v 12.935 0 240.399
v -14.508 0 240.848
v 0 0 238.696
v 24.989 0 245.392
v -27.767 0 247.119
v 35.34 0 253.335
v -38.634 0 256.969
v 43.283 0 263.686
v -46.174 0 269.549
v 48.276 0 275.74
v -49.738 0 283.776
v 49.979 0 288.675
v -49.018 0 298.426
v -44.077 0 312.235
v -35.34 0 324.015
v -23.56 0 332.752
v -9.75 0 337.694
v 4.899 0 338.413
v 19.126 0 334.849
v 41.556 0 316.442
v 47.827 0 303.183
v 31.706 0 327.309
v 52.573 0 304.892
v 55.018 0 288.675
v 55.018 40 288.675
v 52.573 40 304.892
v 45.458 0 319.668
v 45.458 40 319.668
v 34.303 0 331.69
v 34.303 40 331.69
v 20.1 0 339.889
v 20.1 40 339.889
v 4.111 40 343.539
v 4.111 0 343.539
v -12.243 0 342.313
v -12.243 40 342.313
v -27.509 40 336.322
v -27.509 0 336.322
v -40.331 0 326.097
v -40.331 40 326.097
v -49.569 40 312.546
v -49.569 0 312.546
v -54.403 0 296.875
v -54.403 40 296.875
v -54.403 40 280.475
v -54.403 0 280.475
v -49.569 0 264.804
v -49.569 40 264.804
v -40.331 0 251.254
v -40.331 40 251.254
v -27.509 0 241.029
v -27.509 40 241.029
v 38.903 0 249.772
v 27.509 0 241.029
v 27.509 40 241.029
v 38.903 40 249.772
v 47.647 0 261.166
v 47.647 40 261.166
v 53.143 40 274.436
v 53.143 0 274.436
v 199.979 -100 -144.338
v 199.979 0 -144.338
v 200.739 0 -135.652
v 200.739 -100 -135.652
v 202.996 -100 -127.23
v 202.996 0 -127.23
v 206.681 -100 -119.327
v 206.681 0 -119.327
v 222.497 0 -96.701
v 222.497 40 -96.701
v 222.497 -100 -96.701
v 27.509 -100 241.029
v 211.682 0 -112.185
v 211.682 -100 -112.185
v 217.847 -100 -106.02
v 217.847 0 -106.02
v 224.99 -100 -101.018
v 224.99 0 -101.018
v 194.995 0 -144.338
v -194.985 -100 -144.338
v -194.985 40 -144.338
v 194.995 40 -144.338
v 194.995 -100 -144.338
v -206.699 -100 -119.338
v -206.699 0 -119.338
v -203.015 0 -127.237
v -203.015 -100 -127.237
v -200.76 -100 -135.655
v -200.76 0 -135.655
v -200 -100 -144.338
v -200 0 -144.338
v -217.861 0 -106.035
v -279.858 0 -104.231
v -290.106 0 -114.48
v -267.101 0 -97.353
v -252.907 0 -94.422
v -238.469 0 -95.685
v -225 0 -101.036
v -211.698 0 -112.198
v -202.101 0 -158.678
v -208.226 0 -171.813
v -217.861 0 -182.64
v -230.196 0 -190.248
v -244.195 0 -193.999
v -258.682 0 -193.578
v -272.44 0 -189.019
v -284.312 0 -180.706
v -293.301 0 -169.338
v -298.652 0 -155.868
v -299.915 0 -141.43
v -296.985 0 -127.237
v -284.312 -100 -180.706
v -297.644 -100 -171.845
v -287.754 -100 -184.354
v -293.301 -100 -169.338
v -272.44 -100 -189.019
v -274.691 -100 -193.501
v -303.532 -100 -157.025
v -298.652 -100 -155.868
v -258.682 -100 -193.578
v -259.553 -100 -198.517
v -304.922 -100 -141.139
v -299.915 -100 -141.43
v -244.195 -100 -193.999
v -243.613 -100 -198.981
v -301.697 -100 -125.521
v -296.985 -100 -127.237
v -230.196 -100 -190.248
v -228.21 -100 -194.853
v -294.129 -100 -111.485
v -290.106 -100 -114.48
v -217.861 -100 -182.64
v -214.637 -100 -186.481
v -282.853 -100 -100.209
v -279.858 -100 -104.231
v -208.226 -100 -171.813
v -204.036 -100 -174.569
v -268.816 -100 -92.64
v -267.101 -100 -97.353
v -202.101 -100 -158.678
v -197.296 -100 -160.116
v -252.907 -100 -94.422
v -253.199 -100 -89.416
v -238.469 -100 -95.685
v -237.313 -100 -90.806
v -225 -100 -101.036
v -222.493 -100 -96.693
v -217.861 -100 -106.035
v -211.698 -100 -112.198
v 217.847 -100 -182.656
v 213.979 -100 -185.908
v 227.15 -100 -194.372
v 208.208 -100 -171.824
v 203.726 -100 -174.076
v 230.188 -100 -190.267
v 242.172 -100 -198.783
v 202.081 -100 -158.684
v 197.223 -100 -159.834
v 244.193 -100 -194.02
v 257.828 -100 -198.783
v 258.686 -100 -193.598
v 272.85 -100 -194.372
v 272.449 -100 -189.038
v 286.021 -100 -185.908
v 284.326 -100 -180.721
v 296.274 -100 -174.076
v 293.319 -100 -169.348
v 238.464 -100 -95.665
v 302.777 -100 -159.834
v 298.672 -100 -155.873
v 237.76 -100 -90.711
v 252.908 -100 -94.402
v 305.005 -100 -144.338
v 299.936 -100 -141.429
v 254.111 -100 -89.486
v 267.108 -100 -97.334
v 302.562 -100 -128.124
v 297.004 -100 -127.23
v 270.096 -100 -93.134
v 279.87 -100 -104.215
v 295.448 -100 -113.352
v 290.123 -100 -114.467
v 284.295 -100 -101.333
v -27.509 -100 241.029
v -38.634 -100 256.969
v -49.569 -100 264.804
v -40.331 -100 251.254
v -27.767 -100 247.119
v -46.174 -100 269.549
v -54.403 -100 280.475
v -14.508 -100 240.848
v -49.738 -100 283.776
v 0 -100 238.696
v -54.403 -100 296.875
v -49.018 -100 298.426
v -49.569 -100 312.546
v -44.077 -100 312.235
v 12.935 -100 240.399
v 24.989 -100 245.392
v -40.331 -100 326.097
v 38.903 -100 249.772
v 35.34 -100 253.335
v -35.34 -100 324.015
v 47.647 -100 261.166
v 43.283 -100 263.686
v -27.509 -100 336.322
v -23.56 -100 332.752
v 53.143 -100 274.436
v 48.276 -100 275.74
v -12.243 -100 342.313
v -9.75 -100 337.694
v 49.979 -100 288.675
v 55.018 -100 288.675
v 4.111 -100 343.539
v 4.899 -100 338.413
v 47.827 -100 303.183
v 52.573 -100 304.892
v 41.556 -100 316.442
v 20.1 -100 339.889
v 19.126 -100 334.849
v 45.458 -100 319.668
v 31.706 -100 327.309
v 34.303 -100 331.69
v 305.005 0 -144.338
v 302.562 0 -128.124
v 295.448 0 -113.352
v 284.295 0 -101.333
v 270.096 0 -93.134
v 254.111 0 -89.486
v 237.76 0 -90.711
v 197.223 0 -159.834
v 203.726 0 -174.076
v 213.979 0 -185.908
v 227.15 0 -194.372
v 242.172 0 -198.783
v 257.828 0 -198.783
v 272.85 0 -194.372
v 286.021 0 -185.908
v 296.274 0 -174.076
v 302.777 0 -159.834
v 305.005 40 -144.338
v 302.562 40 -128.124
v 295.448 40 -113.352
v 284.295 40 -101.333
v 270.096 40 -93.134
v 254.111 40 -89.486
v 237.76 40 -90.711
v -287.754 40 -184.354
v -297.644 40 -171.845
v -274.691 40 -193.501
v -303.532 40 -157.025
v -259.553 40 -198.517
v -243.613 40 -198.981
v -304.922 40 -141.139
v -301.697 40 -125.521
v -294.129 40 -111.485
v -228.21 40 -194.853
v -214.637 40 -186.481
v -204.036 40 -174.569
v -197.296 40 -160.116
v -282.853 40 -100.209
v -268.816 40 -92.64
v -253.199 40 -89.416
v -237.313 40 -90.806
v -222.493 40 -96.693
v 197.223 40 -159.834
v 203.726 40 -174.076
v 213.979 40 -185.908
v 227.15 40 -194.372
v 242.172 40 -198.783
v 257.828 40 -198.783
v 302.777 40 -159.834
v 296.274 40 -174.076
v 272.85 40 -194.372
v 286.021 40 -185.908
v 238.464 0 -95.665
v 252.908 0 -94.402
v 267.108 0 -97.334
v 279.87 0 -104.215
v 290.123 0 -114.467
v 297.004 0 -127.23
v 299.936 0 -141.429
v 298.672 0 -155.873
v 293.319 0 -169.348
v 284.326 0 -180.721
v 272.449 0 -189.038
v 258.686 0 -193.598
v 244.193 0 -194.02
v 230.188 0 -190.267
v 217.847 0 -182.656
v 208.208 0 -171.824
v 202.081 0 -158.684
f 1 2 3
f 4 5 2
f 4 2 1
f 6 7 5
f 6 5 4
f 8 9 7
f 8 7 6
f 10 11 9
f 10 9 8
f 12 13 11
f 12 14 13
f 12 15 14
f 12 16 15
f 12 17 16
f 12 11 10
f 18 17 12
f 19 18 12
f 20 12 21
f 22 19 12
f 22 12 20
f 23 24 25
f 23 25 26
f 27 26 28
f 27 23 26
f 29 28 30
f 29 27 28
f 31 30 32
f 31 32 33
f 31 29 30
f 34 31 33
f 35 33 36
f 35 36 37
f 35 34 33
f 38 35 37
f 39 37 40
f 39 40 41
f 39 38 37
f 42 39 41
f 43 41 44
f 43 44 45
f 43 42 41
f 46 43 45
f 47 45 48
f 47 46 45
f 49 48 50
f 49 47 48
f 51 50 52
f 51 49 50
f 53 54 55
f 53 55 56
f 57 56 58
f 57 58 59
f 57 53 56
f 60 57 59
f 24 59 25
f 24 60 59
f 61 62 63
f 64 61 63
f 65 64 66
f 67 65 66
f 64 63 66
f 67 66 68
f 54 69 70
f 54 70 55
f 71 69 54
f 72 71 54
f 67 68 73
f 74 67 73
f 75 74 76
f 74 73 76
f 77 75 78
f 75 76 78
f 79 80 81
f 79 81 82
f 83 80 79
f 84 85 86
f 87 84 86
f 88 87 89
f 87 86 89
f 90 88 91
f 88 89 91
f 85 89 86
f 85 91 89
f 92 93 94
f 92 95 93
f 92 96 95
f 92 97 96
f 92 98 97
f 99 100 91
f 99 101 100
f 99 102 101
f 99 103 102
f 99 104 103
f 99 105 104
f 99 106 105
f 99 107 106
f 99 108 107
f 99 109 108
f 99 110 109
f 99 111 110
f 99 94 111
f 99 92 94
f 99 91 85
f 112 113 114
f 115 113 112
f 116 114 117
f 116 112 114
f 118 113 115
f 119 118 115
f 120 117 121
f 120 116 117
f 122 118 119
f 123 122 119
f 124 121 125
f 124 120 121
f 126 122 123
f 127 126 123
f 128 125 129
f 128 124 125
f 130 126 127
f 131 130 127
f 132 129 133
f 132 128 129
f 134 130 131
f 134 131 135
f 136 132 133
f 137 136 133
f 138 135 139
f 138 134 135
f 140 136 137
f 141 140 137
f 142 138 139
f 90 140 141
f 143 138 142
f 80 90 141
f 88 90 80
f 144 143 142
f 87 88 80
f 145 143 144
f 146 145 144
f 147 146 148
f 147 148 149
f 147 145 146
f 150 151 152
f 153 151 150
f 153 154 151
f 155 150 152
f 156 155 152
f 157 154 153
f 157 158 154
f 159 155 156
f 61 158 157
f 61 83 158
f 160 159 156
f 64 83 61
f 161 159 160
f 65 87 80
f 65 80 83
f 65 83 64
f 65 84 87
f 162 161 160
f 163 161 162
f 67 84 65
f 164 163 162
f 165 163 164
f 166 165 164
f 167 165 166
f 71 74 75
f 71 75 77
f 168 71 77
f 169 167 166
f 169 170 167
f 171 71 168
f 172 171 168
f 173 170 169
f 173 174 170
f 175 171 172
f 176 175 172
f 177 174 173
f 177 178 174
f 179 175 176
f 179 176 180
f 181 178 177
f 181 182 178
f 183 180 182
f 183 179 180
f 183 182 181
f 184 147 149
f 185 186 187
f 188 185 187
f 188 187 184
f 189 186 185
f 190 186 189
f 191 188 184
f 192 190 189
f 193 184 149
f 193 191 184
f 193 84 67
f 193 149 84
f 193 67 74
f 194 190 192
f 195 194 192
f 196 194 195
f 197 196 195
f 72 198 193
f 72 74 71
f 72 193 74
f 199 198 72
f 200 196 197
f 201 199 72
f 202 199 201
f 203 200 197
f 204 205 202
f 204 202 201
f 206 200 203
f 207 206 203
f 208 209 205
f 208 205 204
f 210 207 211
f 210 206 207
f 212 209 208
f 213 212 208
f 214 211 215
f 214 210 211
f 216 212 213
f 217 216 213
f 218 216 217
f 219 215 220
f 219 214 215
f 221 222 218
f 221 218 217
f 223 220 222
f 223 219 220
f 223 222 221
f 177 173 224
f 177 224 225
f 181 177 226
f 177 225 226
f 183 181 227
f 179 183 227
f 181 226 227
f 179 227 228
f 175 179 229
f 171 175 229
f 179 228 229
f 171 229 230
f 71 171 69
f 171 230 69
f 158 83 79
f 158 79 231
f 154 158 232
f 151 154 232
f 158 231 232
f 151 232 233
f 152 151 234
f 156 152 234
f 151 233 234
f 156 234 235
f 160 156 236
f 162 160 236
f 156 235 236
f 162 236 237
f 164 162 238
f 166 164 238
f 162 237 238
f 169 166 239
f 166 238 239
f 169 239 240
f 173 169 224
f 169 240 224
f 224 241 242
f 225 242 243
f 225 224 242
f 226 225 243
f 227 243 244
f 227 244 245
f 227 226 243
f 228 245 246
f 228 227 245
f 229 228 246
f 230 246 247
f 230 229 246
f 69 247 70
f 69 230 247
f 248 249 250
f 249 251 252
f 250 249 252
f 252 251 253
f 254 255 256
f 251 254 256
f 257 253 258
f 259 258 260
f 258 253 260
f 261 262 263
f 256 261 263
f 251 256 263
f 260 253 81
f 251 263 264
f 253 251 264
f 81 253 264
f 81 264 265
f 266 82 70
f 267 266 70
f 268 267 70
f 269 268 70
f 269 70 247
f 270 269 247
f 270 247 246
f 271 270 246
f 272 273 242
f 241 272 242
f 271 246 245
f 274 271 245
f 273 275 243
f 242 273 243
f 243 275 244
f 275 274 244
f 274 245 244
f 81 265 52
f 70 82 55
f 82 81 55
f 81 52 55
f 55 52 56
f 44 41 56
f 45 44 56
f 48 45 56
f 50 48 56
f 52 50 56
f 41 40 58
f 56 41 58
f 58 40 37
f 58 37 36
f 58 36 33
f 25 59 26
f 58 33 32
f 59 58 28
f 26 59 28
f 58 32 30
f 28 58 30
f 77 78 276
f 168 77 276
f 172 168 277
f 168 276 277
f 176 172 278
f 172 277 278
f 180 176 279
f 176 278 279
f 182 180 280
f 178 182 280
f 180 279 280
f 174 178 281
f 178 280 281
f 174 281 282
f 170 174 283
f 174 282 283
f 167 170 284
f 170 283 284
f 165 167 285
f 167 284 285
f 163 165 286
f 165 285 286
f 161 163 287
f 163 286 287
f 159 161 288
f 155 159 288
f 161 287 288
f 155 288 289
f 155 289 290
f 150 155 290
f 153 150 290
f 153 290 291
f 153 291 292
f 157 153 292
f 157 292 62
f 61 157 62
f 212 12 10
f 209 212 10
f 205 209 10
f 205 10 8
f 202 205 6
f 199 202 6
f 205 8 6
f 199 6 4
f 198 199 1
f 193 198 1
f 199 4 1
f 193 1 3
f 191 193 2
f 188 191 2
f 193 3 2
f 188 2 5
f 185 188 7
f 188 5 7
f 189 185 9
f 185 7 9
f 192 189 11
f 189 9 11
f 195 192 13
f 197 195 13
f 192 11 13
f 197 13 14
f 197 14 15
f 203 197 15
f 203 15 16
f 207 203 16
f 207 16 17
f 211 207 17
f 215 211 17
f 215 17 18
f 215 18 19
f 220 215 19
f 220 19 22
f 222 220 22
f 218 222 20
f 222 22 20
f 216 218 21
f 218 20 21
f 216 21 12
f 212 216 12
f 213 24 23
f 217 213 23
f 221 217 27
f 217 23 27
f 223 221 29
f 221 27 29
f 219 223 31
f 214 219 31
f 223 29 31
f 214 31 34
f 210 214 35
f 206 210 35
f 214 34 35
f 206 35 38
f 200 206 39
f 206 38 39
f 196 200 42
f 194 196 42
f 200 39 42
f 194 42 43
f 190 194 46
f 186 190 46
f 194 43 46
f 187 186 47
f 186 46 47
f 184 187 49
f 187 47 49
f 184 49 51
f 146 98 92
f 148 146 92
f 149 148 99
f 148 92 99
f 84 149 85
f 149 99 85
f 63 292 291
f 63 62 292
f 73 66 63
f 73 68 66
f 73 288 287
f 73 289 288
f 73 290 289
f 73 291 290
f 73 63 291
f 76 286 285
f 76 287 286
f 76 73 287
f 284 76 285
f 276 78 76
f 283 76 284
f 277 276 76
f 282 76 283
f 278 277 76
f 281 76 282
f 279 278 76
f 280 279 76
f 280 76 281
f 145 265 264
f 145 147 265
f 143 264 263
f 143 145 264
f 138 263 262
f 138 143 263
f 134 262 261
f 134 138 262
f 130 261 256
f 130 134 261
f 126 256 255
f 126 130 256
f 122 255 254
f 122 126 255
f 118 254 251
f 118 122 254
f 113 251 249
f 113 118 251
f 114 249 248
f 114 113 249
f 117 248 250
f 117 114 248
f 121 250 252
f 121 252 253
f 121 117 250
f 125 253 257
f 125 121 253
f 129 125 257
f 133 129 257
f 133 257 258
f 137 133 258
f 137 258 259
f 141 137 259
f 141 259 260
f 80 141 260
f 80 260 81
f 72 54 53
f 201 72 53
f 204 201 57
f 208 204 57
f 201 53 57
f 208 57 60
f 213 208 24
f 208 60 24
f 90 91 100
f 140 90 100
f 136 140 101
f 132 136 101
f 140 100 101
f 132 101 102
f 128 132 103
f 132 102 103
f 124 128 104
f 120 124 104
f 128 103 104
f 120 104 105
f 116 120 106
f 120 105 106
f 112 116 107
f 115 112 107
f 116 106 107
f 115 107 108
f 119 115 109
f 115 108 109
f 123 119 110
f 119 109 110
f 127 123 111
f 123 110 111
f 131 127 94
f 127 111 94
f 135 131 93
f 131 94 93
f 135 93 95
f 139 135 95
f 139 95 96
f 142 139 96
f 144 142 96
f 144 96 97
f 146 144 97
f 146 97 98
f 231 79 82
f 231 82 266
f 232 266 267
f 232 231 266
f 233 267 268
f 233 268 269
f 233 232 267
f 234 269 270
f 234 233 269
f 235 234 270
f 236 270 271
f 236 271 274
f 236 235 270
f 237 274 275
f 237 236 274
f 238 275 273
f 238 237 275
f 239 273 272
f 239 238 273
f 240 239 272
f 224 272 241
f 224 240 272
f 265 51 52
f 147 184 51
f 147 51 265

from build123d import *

# Parameters (mm, degrees)
F1_DEPTH = 100
F2_DEPTH = 40


with BuildPart() as f1:
    # F0 (on Front) → F1 (new body)
    with BuildSketch(Plane.XZ):
        with BuildLine():
            ThreePointArc((-222.4925176197, -96.6932102265), (-297.6443570709, -171.8450496777), (-194.9850352394, -144.3375672974))
            Line((-194.9850352394, -144.3375672974), (-200, -144.3375672974))
            ThreePointArc((-200, -144.3375672974), (-293.3012701892, -169.3375672974), (-225, -101.0362971082))
            Line((-225, -101.0362971082), (-222.4925176197, -96.6932102265))
        make_face()
        with BuildLine():
            Line((-202.3556429291, -116.8300849171), (0, 0))
            Line((0, 0), (-125, 72.1687836487))
            Line((-125, 72.1687836487), (-222.4925176197, -96.6932102265))
            ThreePointArc((-222.4925176197, -96.6932102265), (-211.0985453511, -105.4361126485), (-202.3556429291, -116.8300849171))
        make_face()
        with BuildLine():
            Line((-194.9850352394, -144.3375672974), (0, -144.3375672974))
            Line((0, -144.3375672974), (0, 0))
            Line((0, 0), (-202.3556429291, -116.8300849171))
            ThreePointArc((-202.3556429291, -116.8300849171), (-196.8596247054, -130.0986466517), (-194.9850352394, -144.3375672974))
        make_face()
        with BuildLine():
            Line((-206.6987298108, -119.3375672974), (-202.3556429291, -116.8300849171))
            ThreePointArc((-202.3556429291, -116.8300849171), (-211.0985453511, -105.4361126485), (-222.4925176197, -96.6932102265))
            Line((-222.4925176197, -96.6932102265), (-225, -101.0362971082))
            ThreePointArc((-225, -101.0362971082), (-214.6446609407, -108.9822282381), (-206.6987298108, -119.3375672974))
        make_face()
        with BuildLine():
            Line((-200, -144.3375672974), (-194.9850352394, -144.3375672974))
            ThreePointArc((-194.9850352394, -144.3375672974), (-196.8596247054, -130.0986466517), (-202.3556429291, -116.8300849171))
            Line((-202.3556429291, -116.8300849171), (-206.6987298108, -119.3375672974))
            ThreePointArc((-206.6987298108, -119.3375672974), (-201.7037086855, -131.3966150423), (-200, -144.3375672974))
        make_face()
        with BuildLine():
            Line((0, 0), (0, -144.3375672974))
            Line((0, -144.3375672974), (194.9945565085, -144.3375672974))
            ThreePointArc((194.9945565085, -144.3375672974), (196.8688215451, -130.1011109375), (202.36388859, -116.8348455517))
            Line((202.36388859, -116.8348455517), (0, 0))
        make_face()
        with BuildLine():
            Line((125, 72.1687836487), (0, 0))
            Line((0, 0), (202.36388859, -116.8348455517))
            ThreePointArc((202.36388859, -116.8348455517), (211.105277905, -105.4428452024), (222.4972782543, -96.7014558874))
            Line((222.4972782543, -96.7014558874), (125, 72.1687836487))
        make_face()
        with BuildLine():
            Line((0, 233.6576304529), (0, 0))
            Line((0, 0), (125, 72.1687836487))
            Line((125, 72.1687836487), (27.5087520709, 241.0285783551))
            ThreePointArc((27.5087520709, 241.0285783551), (14.2395778859, 235.5323064462), (0, 233.6576304529))
        make_face()
        with BuildLine():
            ThreePointArc((222.4972782543, -96.7014558874), (211.105277905, -105.4428452024), (202.36388859, -116.8348455517))
            Line((202.36388859, -116.8348455517), (206.6809069942, -119.3272772894))
            ThreePointArc((206.6809069942, -119.3272772894), (214.6301086719, -108.9676759693), (224.989709992, -101.0184742916))
            Line((224.989709992, -101.0184742916), (222.4972782543, -96.7014558874))
        make_face()
        with BuildLine():
            ThreePointArc((202.36388859, -116.8348455517), (196.8688215451, -130.1011109375), (194.9945565085, -144.3375672974))
            Line((194.9945565085, -144.3375672974), (199.9794199841, -144.3375672974))
            ThreePointArc((199.9794199841, -144.3375672974), (201.6838299167, -131.3912885422), (206.6809069942, -119.3272772894))
            Line((206.6809069942, -119.3272772894), (202.36388859, -116.8348455517))
        make_face()
        with BuildLine():
            Line((199.9794199841, -144.3375672974), (194.9945565085, -144.3375672974))
            ThreePointArc((194.9945565085, -144.3375672974), (250, -199.3430107889), (305.0054434915, -144.3375672974))
            ThreePointArc((305.0054434915, -144.3375672974), (277.5027217457, -96.7014558874), (222.4972782543, -96.7014558874))
            Line((222.4972782543, -96.7014558874), (224.989709992, -101.0184742916))
            ThreePointArc((224.989709992, -101.0184742916), (275.010290008, -101.0184742916), (300.0205800159, -144.3375672974))
            ThreePointArc((300.0205800159, -144.3375672974), (250, -194.3581473133), (199.9794199841, -144.3375672974))
        make_face()
        with BuildLine():
            Line((-125, 72.1687836487), (0, 0))
            Line((0, 0), (0, 233.6576304529))
            ThreePointArc((0, 233.6576304529), (-14.2395778859, 235.5323064462), (-27.5087520709, 241.0285783551))
            Line((-27.5087520709, 241.0285783551), (-125, 72.1687836487))
        make_face()
        with BuildLine():
            ThreePointArc((55.0175041419, 288.6751345948), (-27.5087520709, 336.3216908345), (-27.5087520709, 241.0285783551))
            Line((-27.5087520709, 241.0285783551), (-24.9893809816, 245.392257085))
            ThreePointArc((-24.9893809816, 245.392257085), (-24.9893809816, 331.9580121046), (49.9787619632, 288.6751345948))
            ThreePointArc((49.9787619632, 288.6751345948), (43.2828775098, 263.6857536132), (24.9893809816, 245.392257085))
            Line((24.9893809816, 245.392257085), (27.5087520709, 241.0285783551))
            ThreePointArc((27.5087520709, 241.0285783551), (47.6465562397, 261.1663825239), (55.0175041419, 288.6751345948))
        make_face()
        with BuildLine():
            Line((0, 238.6963726316), (0, 233.6576304529))
            ThreePointArc((0, 233.6576304529), (14.2395778859, 235.5323064462), (27.5087520709, 241.0285783551))
            Line((27.5087520709, 241.0285783551), (24.9893809816, 245.392257085))
            ThreePointArc((24.9893809816, 245.392257085), (12.9354554467, 240.3993576486), (0, 238.6963726316))
        make_face()
        with BuildLine():
            ThreePointArc((-27.5087520709, 241.0285783551), (-14.2395778859, 235.5323064462), (0, 233.6576304529))
            Line((0, 233.6576304529), (0, 238.6963726316))
            ThreePointArc((0, 238.6963726316), (-12.9354554467, 240.3993576486), (-24.9893809816, 245.392257085))
            Line((-24.9893809816, 245.392257085), (-27.5087520709, 241.0285783551))
        make_face()
    extrude(amount=F1_DEPTH)

    # F0 (on Front) → F2 (join)
    with BuildSketch(Plane.XZ):
        with BuildLine():
            Line((-24.9893809816, 245.392257085), (0, 288.6751345948))
            Line((0, 288.6751345948), (24.9893809816, 245.392257085))
            ThreePointArc((24.9893809816, 245.392257085), (43.2828775098, 263.6857536132), (49.9787619632, 288.6751345948))
            ThreePointArc((49.9787619632, 288.6751345948), (-24.9893809816, 331.9580121046), (-24.9893809816, 245.392257085))
        make_face()
        with BuildLine():
            Line((0, 233.6576304529), (0, 0))
            Line((0, 0), (125, 72.1687836487))
            Line((125, 72.1687836487), (27.5087520709, 241.0285783551))
            ThreePointArc((27.5087520709, 241.0285783551), (14.2395778859, 235.5323064462), (0, 233.6576304529))
        make_face()
        with BuildLine():
            Line((-125, 72.1687836487), (0, 0))
            Line((0, 0), (0, 233.6576304529))
            ThreePointArc((0, 233.6576304529), (-14.2395778859, 235.5323064462), (-27.5087520709, 241.0285783551))
            Line((-27.5087520709, 241.0285783551), (-125, 72.1687836487))
        make_face()
        with BuildLine():
            ThreePointArc((-24.9893809816, 245.392257085), (-12.9354554467, 240.3993576486), (0, 238.6963726316))
            Line((0, 238.6963726316), (0, 288.6751345948))
            Line((0, 288.6751345948), (-24.9893809816, 245.392257085))
        make_face()
        with BuildLine():
            Line((0, 288.6751345948), (0, 238.6963726316))
            ThreePointArc((0, 238.6963726316), (12.9354554467, 240.3993576486), (24.9893809816, 245.392257085))
            Line((24.9893809816, 245.392257085), (0, 288.6751345948))
        make_face()
        with BuildLine():
            Line((0, 238.6963726316), (0, 233.6576304529))
            ThreePointArc((0, 233.6576304529), (14.2395778859, 235.5323064462), (27.5087520709, 241.0285783551))
            Line((27.5087520709, 241.0285783551), (24.9893809816, 245.392257085))
            ThreePointArc((24.9893809816, 245.392257085), (12.9354554467, 240.3993576486), (0, 238.6963726316))
        make_face()
        with BuildLine():
            ThreePointArc((-27.5087520709, 241.0285783551), (-14.2395778859, 235.5323064462), (0, 233.6576304529))
            Line((0, 233.6576304529), (0, 238.6963726316))
            ThreePointArc((0, 238.6963726316), (-12.9354554467, 240.3993576486), (-24.9893809816, 245.392257085))
            Line((-24.9893809816, 245.392257085), (-27.5087520709, 241.0285783551))
        make_face()
        with BuildLine():
            ThreePointArc((55.0175041419, 288.6751345948), (-27.5087520709, 336.3216908345), (-27.5087520709, 241.0285783551))
            Line((-27.5087520709, 241.0285783551), (-24.9893809816, 245.392257085))
            ThreePointArc((-24.9893809816, 245.392257085), (-24.9893809816, 331.9580121046), (49.9787619632, 288.6751345948))
            ThreePointArc((49.9787619632, 288.6751345948), (43.2828775098, 263.6857536132), (24.9893809816, 245.392257085))
            Line((24.9893809816, 245.392257085), (27.5087520709, 241.0285783551))
            ThreePointArc((27.5087520709, 241.0285783551), (47.6465562397, 261.1663825239), (55.0175041419, 288.6751345948))
        make_face()
        with BuildLine():
            Line((-202.3556429291, -116.8300849171), (0, 0))
            Line((0, 0), (-125, 72.1687836487))
            Line((-125, 72.1687836487), (-222.4925176197, -96.6932102265))
            ThreePointArc((-222.4925176197, -96.6932102265), (-211.0985453511, -105.4361126485), (-202.3556429291, -116.8300849171))
        make_face()
        with BuildLine():
            Line((-194.9850352394, -144.3375672974), (0, -144.3375672974))
            Line((0, -144.3375672974), (0, 0))
            Line((0, 0), (-202.3556429291, -116.8300849171))
            ThreePointArc((-202.3556429291, -116.8300849171), (-196.8596247054, -130.0986466517), (-194.9850352394, -144.3375672974))
        make_face()
        with BuildLine():
            Line((0, 0), (0, -144.3375672974))
            Line((0, -144.3375672974), (194.9945565085, -144.3375672974))
            ThreePointArc((194.9945565085, -144.3375672974), (196.8688215451, -130.1011109375), (202.36388859, -116.8348455517))
            Line((202.36388859, -116.8348455517), (0, 0))
        make_face()
        with BuildLine():
            Line((125, 72.1687836487), (0, 0))
            Line((0, 0), (202.36388859, -116.8348455517))
            ThreePointArc((202.36388859, -116.8348455517), (211.105277905, -105.4428452024), (222.4972782543, -96.7014558874))
            Line((222.4972782543, -96.7014558874), (125, 72.1687836487))
        make_face()
        with BuildLine():
            Line((206.6809069942, -119.3272772894), (250, -144.3375672974))
            Line((250, -144.3375672974), (224.989709992, -101.0184742916))
            ThreePointArc((224.989709992, -101.0184742916), (214.6301086719, -108.9676759693), (206.6809069942, -119.3272772894))
        make_face()
        with BuildLine():
            Line((250, -144.3375672974), (199.9794199841, -144.3375672974))
            ThreePointArc((199.9794199841, -144.3375672974), (250, -194.3581473133), (300.0205800159, -144.3375672974))
            ThreePointArc((300.0205800159, -144.3375672974), (275.010290008, -101.0184742916), (224.989709992, -101.0184742916))
            Line((224.989709992, -101.0184742916), (250, -144.3375672974))
        make_face()
        with BuildLine():
            Line((199.9794199841, -144.3375672974), (194.9945565085, -144.3375672974))
            ThreePointArc((194.9945565085, -144.3375672974), (250, -199.3430107889), (305.0054434915, -144.3375672974))
            ThreePointArc((305.0054434915, -144.3375672974), (277.5027217457, -96.7014558874), (222.4972782543, -96.7014558874))
            Line((222.4972782543, -96.7014558874), (224.989709992, -101.0184742916))
            ThreePointArc((224.989709992, -101.0184742916), (275.010290008, -101.0184742916), (300.0205800159, -144.3375672974))
            ThreePointArc((300.0205800159, -144.3375672974), (250, -194.3581473133), (199.9794199841, -144.3375672974))
        make_face()
        with BuildLine():
            ThreePointArc((222.4972782543, -96.7014558874), (211.105277905, -105.4428452024), (202.36388859, -116.8348455517))
            Line((202.36388859, -116.8348455517), (206.6809069942, -119.3272772894))
            ThreePointArc((206.6809069942, -119.3272772894), (214.6301086719, -108.9676759693), (224.989709992, -101.0184742916))
            Line((224.989709992, -101.0184742916), (222.4972782543, -96.7014558874))
        make_face()
        with BuildLine():
            ThreePointArc((202.36388859, -116.8348455517), (196.8688215451, -130.1011109375), (194.9945565085, -144.3375672974))
            Line((194.9945565085, -144.3375672974), (199.9794199841, -144.3375672974))
            ThreePointArc((199.9794199841, -144.3375672974), (201.6838299167, -131.3912885422), (206.6809069942, -119.3272772894))
            Line((206.6809069942, -119.3272772894), (202.36388859, -116.8348455517))
        make_face()
        with BuildLine():
            ThreePointArc((206.6809069942, -119.3272772894), (201.6838299167, -131.3912885422), (199.9794199841, -144.3375672974))
            Line((199.9794199841, -144.3375672974), (250, -144.3375672974))
            Line((250, -144.3375672974), (206.6809069942, -119.3272772894))
        make_face()
        with BuildLine():
            Line((-225, -101.0362971082), (-250, -144.3375672974))
            Line((-250, -144.3375672974), (-206.6987298108, -119.3375672974))
            ThreePointArc((-206.6987298108, -119.3375672974), (-214.6446609407, -108.9822282381), (-225, -101.0362971082))
        make_face()
        with BuildLine():
            Line((-206.6987298108, -119.3375672974), (-202.3556429291, -116.8300849171))
            ThreePointArc((-202.3556429291, -116.8300849171), (-211.0985453511, -105.4361126485), (-222.4925176197, -96.6932102265))
            Line((-222.4925176197, -96.6932102265), (-225, -101.0362971082))
            ThreePointArc((-225, -101.0362971082), (-214.6446609407, -108.9822282381), (-206.6987298108, -119.3375672974))
        make_face()
        with BuildLine():
            ThreePointArc((-222.4925176197, -96.6932102265), (-297.6443570709, -171.8450496777), (-194.9850352394, -144.3375672974))
            Line((-194.9850352394, -144.3375672974), (-200, -144.3375672974))
            ThreePointArc((-200, -144.3375672974), (-293.3012701892, -169.3375672974), (-225, -101.0362971082))
            Line((-225, -101.0362971082), (-222.4925176197, -96.6932102265))
        make_face()
        with BuildLine():
            ThreePointArc((-225, -101.0362971082), (-293.3012701892, -169.3375672974), (-200, -144.3375672974))
            Line((-200, -144.3375672974), (-250, -144.3375672974))
            Line((-250, -144.3375672974), (-225, -101.0362971082))
        make_face()
        with BuildLine():
            Line((-250, -144.3375672974), (-200, -144.3375672974))
            ThreePointArc((-200, -144.3375672974), (-201.7037086855, -131.3966150423), (-206.6987298108, -119.3375672974))
            Line((-206.6987298108, -119.3375672974), (-250, -144.3375672974))
        make_face()
        with BuildLine():
            Line((-200, -144.3375672974), (-194.9850352394, -144.3375672974))
            ThreePointArc((-194.9850352394, -144.3375672974), (-196.8596247054, -130.0986466517), (-202.3556429291, -116.8300849171))
            Line((-202.3556429291, -116.8300849171), (-206.6987298108, -119.3375672974))
            ThreePointArc((-206.6987298108, -119.3375672974), (-201.7037086855, -131.3966150423), (-200, -144.3375672974))
        make_face()
    extrude(amount=-F2_DEPTH)


solid = f1.part
